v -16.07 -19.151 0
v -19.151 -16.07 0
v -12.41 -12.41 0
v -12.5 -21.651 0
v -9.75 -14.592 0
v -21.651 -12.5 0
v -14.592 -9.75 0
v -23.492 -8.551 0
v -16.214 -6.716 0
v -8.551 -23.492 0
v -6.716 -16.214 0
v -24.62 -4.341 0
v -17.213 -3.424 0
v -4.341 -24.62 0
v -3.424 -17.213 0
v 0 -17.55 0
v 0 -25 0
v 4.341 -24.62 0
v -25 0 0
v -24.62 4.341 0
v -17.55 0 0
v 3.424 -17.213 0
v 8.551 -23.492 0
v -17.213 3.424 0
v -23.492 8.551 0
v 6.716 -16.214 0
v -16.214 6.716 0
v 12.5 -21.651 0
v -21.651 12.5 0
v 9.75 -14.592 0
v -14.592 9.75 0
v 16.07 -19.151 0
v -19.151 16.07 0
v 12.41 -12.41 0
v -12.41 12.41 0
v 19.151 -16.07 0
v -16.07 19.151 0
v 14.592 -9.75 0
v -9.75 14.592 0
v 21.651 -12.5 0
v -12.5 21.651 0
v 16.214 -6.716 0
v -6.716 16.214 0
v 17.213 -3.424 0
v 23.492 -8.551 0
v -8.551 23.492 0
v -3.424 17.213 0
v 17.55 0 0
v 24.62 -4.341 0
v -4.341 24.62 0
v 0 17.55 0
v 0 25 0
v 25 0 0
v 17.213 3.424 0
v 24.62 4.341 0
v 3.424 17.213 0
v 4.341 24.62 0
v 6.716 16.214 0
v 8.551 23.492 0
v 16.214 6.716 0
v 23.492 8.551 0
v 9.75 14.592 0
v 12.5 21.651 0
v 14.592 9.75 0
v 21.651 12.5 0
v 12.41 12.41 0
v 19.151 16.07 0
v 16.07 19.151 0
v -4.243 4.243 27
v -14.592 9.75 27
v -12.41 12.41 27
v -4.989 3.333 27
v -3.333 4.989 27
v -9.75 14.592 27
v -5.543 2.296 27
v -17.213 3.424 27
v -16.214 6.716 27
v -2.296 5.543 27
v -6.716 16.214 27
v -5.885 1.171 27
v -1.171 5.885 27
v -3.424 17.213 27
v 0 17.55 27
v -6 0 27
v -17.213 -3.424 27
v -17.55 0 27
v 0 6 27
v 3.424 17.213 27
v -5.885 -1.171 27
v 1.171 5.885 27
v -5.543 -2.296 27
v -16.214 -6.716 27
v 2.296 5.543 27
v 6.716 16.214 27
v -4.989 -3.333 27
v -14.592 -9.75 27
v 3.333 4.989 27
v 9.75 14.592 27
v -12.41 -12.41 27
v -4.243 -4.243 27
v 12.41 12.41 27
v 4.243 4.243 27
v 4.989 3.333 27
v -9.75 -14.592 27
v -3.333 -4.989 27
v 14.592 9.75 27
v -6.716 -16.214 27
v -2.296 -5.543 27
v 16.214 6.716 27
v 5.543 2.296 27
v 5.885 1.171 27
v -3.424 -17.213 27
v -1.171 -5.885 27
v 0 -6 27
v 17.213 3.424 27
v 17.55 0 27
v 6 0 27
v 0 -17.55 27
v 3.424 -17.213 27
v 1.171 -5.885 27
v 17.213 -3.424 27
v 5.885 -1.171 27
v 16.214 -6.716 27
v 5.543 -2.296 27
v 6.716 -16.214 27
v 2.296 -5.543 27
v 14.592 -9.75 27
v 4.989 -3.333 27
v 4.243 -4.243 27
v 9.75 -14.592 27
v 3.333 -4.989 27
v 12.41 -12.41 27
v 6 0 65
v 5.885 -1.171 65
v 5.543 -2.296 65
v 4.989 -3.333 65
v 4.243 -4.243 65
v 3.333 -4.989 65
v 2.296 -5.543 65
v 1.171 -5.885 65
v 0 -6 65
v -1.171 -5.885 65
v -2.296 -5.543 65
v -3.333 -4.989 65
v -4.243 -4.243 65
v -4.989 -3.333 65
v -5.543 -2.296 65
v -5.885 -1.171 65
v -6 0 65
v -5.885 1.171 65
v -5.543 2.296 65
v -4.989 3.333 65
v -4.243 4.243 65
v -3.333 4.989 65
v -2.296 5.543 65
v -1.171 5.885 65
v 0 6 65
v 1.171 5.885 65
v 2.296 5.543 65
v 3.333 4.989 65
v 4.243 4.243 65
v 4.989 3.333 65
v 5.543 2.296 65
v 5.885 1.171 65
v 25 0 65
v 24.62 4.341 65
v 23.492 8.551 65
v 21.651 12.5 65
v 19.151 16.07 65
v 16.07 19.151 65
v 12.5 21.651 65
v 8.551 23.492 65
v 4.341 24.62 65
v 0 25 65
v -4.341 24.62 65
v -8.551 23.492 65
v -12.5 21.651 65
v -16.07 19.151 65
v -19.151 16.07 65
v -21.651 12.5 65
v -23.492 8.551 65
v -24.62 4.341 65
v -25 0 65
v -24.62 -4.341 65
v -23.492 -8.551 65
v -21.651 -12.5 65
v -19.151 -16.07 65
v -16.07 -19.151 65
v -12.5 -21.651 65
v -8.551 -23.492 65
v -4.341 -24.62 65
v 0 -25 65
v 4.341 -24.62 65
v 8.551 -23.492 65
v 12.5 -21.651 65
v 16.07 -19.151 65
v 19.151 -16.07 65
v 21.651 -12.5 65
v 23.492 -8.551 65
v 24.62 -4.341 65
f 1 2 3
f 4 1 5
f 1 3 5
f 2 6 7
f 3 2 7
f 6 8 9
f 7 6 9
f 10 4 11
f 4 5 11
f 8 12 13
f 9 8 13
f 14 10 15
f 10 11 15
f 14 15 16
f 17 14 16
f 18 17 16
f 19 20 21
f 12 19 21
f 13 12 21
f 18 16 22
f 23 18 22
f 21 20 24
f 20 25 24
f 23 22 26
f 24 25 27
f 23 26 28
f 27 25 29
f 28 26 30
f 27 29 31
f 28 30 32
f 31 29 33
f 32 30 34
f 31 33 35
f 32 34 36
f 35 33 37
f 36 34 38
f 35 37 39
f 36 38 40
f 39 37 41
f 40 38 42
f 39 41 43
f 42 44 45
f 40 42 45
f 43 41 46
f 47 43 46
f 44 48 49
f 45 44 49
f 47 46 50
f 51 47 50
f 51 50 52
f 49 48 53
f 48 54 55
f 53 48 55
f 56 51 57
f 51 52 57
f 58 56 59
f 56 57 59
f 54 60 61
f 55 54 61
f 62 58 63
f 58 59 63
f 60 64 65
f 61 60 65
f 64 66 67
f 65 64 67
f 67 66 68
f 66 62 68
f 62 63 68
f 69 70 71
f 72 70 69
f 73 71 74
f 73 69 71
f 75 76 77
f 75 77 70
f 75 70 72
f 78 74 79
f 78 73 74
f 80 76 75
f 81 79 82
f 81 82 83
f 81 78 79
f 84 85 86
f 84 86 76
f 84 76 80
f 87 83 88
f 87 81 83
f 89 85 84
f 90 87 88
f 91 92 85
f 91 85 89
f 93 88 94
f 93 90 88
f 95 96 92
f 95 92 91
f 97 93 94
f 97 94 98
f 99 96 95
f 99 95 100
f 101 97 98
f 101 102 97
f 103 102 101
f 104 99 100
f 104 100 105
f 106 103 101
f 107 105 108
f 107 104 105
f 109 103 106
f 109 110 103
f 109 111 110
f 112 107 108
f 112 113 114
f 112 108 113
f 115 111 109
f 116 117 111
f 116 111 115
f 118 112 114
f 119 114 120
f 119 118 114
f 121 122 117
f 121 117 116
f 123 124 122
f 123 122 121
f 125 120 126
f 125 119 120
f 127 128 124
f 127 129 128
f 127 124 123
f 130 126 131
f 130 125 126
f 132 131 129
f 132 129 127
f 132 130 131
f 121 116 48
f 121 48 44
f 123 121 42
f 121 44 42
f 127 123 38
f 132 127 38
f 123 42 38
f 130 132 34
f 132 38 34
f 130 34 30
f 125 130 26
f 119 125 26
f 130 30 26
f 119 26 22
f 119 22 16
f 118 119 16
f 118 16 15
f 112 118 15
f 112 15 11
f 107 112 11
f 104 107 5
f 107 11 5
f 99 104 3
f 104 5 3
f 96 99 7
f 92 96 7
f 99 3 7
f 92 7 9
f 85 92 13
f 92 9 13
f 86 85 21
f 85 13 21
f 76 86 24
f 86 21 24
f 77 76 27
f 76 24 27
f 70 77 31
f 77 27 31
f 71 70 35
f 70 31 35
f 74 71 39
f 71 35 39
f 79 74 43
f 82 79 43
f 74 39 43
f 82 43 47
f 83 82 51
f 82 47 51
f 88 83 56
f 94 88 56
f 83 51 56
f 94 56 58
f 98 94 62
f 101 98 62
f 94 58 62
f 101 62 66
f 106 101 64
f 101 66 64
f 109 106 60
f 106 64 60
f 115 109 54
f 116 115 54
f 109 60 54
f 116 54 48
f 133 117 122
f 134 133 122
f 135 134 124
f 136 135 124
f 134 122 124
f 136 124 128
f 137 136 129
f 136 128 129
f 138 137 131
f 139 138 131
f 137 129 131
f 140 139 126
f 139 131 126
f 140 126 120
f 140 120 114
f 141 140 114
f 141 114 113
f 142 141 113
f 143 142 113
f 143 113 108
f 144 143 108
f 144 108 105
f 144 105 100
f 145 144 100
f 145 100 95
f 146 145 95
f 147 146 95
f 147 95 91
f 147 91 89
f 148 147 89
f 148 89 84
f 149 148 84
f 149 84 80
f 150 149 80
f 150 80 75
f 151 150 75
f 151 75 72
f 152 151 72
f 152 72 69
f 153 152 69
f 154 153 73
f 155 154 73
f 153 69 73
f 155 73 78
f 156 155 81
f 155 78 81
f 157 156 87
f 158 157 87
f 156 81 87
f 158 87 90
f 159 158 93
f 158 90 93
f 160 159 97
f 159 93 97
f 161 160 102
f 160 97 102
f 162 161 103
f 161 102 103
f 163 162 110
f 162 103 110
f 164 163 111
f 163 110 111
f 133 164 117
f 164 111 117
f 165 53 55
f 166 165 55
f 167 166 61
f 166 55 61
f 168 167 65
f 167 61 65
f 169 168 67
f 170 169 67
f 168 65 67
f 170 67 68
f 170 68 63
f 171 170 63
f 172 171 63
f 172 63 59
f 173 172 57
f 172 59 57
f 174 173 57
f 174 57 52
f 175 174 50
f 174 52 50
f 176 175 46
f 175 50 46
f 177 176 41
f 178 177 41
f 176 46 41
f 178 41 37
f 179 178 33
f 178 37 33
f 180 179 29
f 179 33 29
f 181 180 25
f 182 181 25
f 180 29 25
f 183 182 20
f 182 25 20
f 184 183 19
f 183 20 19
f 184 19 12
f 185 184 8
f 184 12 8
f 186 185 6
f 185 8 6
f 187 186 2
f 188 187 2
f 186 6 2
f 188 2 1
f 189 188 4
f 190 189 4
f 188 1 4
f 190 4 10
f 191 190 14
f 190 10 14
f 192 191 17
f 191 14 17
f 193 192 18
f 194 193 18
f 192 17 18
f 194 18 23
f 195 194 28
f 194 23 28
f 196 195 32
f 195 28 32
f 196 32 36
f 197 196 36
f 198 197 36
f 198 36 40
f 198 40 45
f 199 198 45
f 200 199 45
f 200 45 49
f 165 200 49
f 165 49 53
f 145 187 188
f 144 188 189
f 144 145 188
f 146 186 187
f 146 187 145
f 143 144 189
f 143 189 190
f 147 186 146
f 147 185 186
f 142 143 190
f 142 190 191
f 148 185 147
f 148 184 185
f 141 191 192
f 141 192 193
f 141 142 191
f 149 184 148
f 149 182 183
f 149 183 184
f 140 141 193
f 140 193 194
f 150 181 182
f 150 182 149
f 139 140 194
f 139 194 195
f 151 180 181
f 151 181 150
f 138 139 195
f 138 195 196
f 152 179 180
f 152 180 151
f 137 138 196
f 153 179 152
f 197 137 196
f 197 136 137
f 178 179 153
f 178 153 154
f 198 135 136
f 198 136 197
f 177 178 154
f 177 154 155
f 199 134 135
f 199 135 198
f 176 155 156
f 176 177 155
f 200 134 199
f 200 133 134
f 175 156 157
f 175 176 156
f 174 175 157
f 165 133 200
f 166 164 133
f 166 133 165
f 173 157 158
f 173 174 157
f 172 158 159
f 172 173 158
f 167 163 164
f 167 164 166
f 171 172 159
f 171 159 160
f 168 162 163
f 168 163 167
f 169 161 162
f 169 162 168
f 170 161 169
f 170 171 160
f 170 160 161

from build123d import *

# Parameters (mm, degrees)
F0_R     = 25
F0_R_2   = 17.55
F1_DEPTH = 65
F2_R     = 6
F3_DEPTH = 65.001
F4_R     = 17.55
F5_DEPTH = 27


with BuildPart() as f1:
    # F0 (on Top) → F1 (new body)
    with BuildSketch(Plane.XY):
        Circle(F0_R)
        Circle(F0_R_2, mode=Mode.SUBTRACT)
        Circle(F0_R_2)
    extrude(amount=F1_DEPTH)

    # F2 (on face) → F3 (cut, through all)
    with BuildSketch(Plane(origin=(0, 0, 0), x_dir=(1, 0, 0), z_dir=(0, 0, -1))):
        Circle(F2_R)
    extrude(amount=-F3_DEPTH, mode=Mode.SUBTRACT)

    # F4 (on face) → F5 (cut)
    with BuildSketch(Plane(origin=(0, 0, 0), x_dir=(1, 0, 0), z_dir=(0, 0, -1))):
        Circle(F4_R)
    extrude(amount=-F5_DEPTH, mode=Mode.SUBTRACT)


solid = f1.part
